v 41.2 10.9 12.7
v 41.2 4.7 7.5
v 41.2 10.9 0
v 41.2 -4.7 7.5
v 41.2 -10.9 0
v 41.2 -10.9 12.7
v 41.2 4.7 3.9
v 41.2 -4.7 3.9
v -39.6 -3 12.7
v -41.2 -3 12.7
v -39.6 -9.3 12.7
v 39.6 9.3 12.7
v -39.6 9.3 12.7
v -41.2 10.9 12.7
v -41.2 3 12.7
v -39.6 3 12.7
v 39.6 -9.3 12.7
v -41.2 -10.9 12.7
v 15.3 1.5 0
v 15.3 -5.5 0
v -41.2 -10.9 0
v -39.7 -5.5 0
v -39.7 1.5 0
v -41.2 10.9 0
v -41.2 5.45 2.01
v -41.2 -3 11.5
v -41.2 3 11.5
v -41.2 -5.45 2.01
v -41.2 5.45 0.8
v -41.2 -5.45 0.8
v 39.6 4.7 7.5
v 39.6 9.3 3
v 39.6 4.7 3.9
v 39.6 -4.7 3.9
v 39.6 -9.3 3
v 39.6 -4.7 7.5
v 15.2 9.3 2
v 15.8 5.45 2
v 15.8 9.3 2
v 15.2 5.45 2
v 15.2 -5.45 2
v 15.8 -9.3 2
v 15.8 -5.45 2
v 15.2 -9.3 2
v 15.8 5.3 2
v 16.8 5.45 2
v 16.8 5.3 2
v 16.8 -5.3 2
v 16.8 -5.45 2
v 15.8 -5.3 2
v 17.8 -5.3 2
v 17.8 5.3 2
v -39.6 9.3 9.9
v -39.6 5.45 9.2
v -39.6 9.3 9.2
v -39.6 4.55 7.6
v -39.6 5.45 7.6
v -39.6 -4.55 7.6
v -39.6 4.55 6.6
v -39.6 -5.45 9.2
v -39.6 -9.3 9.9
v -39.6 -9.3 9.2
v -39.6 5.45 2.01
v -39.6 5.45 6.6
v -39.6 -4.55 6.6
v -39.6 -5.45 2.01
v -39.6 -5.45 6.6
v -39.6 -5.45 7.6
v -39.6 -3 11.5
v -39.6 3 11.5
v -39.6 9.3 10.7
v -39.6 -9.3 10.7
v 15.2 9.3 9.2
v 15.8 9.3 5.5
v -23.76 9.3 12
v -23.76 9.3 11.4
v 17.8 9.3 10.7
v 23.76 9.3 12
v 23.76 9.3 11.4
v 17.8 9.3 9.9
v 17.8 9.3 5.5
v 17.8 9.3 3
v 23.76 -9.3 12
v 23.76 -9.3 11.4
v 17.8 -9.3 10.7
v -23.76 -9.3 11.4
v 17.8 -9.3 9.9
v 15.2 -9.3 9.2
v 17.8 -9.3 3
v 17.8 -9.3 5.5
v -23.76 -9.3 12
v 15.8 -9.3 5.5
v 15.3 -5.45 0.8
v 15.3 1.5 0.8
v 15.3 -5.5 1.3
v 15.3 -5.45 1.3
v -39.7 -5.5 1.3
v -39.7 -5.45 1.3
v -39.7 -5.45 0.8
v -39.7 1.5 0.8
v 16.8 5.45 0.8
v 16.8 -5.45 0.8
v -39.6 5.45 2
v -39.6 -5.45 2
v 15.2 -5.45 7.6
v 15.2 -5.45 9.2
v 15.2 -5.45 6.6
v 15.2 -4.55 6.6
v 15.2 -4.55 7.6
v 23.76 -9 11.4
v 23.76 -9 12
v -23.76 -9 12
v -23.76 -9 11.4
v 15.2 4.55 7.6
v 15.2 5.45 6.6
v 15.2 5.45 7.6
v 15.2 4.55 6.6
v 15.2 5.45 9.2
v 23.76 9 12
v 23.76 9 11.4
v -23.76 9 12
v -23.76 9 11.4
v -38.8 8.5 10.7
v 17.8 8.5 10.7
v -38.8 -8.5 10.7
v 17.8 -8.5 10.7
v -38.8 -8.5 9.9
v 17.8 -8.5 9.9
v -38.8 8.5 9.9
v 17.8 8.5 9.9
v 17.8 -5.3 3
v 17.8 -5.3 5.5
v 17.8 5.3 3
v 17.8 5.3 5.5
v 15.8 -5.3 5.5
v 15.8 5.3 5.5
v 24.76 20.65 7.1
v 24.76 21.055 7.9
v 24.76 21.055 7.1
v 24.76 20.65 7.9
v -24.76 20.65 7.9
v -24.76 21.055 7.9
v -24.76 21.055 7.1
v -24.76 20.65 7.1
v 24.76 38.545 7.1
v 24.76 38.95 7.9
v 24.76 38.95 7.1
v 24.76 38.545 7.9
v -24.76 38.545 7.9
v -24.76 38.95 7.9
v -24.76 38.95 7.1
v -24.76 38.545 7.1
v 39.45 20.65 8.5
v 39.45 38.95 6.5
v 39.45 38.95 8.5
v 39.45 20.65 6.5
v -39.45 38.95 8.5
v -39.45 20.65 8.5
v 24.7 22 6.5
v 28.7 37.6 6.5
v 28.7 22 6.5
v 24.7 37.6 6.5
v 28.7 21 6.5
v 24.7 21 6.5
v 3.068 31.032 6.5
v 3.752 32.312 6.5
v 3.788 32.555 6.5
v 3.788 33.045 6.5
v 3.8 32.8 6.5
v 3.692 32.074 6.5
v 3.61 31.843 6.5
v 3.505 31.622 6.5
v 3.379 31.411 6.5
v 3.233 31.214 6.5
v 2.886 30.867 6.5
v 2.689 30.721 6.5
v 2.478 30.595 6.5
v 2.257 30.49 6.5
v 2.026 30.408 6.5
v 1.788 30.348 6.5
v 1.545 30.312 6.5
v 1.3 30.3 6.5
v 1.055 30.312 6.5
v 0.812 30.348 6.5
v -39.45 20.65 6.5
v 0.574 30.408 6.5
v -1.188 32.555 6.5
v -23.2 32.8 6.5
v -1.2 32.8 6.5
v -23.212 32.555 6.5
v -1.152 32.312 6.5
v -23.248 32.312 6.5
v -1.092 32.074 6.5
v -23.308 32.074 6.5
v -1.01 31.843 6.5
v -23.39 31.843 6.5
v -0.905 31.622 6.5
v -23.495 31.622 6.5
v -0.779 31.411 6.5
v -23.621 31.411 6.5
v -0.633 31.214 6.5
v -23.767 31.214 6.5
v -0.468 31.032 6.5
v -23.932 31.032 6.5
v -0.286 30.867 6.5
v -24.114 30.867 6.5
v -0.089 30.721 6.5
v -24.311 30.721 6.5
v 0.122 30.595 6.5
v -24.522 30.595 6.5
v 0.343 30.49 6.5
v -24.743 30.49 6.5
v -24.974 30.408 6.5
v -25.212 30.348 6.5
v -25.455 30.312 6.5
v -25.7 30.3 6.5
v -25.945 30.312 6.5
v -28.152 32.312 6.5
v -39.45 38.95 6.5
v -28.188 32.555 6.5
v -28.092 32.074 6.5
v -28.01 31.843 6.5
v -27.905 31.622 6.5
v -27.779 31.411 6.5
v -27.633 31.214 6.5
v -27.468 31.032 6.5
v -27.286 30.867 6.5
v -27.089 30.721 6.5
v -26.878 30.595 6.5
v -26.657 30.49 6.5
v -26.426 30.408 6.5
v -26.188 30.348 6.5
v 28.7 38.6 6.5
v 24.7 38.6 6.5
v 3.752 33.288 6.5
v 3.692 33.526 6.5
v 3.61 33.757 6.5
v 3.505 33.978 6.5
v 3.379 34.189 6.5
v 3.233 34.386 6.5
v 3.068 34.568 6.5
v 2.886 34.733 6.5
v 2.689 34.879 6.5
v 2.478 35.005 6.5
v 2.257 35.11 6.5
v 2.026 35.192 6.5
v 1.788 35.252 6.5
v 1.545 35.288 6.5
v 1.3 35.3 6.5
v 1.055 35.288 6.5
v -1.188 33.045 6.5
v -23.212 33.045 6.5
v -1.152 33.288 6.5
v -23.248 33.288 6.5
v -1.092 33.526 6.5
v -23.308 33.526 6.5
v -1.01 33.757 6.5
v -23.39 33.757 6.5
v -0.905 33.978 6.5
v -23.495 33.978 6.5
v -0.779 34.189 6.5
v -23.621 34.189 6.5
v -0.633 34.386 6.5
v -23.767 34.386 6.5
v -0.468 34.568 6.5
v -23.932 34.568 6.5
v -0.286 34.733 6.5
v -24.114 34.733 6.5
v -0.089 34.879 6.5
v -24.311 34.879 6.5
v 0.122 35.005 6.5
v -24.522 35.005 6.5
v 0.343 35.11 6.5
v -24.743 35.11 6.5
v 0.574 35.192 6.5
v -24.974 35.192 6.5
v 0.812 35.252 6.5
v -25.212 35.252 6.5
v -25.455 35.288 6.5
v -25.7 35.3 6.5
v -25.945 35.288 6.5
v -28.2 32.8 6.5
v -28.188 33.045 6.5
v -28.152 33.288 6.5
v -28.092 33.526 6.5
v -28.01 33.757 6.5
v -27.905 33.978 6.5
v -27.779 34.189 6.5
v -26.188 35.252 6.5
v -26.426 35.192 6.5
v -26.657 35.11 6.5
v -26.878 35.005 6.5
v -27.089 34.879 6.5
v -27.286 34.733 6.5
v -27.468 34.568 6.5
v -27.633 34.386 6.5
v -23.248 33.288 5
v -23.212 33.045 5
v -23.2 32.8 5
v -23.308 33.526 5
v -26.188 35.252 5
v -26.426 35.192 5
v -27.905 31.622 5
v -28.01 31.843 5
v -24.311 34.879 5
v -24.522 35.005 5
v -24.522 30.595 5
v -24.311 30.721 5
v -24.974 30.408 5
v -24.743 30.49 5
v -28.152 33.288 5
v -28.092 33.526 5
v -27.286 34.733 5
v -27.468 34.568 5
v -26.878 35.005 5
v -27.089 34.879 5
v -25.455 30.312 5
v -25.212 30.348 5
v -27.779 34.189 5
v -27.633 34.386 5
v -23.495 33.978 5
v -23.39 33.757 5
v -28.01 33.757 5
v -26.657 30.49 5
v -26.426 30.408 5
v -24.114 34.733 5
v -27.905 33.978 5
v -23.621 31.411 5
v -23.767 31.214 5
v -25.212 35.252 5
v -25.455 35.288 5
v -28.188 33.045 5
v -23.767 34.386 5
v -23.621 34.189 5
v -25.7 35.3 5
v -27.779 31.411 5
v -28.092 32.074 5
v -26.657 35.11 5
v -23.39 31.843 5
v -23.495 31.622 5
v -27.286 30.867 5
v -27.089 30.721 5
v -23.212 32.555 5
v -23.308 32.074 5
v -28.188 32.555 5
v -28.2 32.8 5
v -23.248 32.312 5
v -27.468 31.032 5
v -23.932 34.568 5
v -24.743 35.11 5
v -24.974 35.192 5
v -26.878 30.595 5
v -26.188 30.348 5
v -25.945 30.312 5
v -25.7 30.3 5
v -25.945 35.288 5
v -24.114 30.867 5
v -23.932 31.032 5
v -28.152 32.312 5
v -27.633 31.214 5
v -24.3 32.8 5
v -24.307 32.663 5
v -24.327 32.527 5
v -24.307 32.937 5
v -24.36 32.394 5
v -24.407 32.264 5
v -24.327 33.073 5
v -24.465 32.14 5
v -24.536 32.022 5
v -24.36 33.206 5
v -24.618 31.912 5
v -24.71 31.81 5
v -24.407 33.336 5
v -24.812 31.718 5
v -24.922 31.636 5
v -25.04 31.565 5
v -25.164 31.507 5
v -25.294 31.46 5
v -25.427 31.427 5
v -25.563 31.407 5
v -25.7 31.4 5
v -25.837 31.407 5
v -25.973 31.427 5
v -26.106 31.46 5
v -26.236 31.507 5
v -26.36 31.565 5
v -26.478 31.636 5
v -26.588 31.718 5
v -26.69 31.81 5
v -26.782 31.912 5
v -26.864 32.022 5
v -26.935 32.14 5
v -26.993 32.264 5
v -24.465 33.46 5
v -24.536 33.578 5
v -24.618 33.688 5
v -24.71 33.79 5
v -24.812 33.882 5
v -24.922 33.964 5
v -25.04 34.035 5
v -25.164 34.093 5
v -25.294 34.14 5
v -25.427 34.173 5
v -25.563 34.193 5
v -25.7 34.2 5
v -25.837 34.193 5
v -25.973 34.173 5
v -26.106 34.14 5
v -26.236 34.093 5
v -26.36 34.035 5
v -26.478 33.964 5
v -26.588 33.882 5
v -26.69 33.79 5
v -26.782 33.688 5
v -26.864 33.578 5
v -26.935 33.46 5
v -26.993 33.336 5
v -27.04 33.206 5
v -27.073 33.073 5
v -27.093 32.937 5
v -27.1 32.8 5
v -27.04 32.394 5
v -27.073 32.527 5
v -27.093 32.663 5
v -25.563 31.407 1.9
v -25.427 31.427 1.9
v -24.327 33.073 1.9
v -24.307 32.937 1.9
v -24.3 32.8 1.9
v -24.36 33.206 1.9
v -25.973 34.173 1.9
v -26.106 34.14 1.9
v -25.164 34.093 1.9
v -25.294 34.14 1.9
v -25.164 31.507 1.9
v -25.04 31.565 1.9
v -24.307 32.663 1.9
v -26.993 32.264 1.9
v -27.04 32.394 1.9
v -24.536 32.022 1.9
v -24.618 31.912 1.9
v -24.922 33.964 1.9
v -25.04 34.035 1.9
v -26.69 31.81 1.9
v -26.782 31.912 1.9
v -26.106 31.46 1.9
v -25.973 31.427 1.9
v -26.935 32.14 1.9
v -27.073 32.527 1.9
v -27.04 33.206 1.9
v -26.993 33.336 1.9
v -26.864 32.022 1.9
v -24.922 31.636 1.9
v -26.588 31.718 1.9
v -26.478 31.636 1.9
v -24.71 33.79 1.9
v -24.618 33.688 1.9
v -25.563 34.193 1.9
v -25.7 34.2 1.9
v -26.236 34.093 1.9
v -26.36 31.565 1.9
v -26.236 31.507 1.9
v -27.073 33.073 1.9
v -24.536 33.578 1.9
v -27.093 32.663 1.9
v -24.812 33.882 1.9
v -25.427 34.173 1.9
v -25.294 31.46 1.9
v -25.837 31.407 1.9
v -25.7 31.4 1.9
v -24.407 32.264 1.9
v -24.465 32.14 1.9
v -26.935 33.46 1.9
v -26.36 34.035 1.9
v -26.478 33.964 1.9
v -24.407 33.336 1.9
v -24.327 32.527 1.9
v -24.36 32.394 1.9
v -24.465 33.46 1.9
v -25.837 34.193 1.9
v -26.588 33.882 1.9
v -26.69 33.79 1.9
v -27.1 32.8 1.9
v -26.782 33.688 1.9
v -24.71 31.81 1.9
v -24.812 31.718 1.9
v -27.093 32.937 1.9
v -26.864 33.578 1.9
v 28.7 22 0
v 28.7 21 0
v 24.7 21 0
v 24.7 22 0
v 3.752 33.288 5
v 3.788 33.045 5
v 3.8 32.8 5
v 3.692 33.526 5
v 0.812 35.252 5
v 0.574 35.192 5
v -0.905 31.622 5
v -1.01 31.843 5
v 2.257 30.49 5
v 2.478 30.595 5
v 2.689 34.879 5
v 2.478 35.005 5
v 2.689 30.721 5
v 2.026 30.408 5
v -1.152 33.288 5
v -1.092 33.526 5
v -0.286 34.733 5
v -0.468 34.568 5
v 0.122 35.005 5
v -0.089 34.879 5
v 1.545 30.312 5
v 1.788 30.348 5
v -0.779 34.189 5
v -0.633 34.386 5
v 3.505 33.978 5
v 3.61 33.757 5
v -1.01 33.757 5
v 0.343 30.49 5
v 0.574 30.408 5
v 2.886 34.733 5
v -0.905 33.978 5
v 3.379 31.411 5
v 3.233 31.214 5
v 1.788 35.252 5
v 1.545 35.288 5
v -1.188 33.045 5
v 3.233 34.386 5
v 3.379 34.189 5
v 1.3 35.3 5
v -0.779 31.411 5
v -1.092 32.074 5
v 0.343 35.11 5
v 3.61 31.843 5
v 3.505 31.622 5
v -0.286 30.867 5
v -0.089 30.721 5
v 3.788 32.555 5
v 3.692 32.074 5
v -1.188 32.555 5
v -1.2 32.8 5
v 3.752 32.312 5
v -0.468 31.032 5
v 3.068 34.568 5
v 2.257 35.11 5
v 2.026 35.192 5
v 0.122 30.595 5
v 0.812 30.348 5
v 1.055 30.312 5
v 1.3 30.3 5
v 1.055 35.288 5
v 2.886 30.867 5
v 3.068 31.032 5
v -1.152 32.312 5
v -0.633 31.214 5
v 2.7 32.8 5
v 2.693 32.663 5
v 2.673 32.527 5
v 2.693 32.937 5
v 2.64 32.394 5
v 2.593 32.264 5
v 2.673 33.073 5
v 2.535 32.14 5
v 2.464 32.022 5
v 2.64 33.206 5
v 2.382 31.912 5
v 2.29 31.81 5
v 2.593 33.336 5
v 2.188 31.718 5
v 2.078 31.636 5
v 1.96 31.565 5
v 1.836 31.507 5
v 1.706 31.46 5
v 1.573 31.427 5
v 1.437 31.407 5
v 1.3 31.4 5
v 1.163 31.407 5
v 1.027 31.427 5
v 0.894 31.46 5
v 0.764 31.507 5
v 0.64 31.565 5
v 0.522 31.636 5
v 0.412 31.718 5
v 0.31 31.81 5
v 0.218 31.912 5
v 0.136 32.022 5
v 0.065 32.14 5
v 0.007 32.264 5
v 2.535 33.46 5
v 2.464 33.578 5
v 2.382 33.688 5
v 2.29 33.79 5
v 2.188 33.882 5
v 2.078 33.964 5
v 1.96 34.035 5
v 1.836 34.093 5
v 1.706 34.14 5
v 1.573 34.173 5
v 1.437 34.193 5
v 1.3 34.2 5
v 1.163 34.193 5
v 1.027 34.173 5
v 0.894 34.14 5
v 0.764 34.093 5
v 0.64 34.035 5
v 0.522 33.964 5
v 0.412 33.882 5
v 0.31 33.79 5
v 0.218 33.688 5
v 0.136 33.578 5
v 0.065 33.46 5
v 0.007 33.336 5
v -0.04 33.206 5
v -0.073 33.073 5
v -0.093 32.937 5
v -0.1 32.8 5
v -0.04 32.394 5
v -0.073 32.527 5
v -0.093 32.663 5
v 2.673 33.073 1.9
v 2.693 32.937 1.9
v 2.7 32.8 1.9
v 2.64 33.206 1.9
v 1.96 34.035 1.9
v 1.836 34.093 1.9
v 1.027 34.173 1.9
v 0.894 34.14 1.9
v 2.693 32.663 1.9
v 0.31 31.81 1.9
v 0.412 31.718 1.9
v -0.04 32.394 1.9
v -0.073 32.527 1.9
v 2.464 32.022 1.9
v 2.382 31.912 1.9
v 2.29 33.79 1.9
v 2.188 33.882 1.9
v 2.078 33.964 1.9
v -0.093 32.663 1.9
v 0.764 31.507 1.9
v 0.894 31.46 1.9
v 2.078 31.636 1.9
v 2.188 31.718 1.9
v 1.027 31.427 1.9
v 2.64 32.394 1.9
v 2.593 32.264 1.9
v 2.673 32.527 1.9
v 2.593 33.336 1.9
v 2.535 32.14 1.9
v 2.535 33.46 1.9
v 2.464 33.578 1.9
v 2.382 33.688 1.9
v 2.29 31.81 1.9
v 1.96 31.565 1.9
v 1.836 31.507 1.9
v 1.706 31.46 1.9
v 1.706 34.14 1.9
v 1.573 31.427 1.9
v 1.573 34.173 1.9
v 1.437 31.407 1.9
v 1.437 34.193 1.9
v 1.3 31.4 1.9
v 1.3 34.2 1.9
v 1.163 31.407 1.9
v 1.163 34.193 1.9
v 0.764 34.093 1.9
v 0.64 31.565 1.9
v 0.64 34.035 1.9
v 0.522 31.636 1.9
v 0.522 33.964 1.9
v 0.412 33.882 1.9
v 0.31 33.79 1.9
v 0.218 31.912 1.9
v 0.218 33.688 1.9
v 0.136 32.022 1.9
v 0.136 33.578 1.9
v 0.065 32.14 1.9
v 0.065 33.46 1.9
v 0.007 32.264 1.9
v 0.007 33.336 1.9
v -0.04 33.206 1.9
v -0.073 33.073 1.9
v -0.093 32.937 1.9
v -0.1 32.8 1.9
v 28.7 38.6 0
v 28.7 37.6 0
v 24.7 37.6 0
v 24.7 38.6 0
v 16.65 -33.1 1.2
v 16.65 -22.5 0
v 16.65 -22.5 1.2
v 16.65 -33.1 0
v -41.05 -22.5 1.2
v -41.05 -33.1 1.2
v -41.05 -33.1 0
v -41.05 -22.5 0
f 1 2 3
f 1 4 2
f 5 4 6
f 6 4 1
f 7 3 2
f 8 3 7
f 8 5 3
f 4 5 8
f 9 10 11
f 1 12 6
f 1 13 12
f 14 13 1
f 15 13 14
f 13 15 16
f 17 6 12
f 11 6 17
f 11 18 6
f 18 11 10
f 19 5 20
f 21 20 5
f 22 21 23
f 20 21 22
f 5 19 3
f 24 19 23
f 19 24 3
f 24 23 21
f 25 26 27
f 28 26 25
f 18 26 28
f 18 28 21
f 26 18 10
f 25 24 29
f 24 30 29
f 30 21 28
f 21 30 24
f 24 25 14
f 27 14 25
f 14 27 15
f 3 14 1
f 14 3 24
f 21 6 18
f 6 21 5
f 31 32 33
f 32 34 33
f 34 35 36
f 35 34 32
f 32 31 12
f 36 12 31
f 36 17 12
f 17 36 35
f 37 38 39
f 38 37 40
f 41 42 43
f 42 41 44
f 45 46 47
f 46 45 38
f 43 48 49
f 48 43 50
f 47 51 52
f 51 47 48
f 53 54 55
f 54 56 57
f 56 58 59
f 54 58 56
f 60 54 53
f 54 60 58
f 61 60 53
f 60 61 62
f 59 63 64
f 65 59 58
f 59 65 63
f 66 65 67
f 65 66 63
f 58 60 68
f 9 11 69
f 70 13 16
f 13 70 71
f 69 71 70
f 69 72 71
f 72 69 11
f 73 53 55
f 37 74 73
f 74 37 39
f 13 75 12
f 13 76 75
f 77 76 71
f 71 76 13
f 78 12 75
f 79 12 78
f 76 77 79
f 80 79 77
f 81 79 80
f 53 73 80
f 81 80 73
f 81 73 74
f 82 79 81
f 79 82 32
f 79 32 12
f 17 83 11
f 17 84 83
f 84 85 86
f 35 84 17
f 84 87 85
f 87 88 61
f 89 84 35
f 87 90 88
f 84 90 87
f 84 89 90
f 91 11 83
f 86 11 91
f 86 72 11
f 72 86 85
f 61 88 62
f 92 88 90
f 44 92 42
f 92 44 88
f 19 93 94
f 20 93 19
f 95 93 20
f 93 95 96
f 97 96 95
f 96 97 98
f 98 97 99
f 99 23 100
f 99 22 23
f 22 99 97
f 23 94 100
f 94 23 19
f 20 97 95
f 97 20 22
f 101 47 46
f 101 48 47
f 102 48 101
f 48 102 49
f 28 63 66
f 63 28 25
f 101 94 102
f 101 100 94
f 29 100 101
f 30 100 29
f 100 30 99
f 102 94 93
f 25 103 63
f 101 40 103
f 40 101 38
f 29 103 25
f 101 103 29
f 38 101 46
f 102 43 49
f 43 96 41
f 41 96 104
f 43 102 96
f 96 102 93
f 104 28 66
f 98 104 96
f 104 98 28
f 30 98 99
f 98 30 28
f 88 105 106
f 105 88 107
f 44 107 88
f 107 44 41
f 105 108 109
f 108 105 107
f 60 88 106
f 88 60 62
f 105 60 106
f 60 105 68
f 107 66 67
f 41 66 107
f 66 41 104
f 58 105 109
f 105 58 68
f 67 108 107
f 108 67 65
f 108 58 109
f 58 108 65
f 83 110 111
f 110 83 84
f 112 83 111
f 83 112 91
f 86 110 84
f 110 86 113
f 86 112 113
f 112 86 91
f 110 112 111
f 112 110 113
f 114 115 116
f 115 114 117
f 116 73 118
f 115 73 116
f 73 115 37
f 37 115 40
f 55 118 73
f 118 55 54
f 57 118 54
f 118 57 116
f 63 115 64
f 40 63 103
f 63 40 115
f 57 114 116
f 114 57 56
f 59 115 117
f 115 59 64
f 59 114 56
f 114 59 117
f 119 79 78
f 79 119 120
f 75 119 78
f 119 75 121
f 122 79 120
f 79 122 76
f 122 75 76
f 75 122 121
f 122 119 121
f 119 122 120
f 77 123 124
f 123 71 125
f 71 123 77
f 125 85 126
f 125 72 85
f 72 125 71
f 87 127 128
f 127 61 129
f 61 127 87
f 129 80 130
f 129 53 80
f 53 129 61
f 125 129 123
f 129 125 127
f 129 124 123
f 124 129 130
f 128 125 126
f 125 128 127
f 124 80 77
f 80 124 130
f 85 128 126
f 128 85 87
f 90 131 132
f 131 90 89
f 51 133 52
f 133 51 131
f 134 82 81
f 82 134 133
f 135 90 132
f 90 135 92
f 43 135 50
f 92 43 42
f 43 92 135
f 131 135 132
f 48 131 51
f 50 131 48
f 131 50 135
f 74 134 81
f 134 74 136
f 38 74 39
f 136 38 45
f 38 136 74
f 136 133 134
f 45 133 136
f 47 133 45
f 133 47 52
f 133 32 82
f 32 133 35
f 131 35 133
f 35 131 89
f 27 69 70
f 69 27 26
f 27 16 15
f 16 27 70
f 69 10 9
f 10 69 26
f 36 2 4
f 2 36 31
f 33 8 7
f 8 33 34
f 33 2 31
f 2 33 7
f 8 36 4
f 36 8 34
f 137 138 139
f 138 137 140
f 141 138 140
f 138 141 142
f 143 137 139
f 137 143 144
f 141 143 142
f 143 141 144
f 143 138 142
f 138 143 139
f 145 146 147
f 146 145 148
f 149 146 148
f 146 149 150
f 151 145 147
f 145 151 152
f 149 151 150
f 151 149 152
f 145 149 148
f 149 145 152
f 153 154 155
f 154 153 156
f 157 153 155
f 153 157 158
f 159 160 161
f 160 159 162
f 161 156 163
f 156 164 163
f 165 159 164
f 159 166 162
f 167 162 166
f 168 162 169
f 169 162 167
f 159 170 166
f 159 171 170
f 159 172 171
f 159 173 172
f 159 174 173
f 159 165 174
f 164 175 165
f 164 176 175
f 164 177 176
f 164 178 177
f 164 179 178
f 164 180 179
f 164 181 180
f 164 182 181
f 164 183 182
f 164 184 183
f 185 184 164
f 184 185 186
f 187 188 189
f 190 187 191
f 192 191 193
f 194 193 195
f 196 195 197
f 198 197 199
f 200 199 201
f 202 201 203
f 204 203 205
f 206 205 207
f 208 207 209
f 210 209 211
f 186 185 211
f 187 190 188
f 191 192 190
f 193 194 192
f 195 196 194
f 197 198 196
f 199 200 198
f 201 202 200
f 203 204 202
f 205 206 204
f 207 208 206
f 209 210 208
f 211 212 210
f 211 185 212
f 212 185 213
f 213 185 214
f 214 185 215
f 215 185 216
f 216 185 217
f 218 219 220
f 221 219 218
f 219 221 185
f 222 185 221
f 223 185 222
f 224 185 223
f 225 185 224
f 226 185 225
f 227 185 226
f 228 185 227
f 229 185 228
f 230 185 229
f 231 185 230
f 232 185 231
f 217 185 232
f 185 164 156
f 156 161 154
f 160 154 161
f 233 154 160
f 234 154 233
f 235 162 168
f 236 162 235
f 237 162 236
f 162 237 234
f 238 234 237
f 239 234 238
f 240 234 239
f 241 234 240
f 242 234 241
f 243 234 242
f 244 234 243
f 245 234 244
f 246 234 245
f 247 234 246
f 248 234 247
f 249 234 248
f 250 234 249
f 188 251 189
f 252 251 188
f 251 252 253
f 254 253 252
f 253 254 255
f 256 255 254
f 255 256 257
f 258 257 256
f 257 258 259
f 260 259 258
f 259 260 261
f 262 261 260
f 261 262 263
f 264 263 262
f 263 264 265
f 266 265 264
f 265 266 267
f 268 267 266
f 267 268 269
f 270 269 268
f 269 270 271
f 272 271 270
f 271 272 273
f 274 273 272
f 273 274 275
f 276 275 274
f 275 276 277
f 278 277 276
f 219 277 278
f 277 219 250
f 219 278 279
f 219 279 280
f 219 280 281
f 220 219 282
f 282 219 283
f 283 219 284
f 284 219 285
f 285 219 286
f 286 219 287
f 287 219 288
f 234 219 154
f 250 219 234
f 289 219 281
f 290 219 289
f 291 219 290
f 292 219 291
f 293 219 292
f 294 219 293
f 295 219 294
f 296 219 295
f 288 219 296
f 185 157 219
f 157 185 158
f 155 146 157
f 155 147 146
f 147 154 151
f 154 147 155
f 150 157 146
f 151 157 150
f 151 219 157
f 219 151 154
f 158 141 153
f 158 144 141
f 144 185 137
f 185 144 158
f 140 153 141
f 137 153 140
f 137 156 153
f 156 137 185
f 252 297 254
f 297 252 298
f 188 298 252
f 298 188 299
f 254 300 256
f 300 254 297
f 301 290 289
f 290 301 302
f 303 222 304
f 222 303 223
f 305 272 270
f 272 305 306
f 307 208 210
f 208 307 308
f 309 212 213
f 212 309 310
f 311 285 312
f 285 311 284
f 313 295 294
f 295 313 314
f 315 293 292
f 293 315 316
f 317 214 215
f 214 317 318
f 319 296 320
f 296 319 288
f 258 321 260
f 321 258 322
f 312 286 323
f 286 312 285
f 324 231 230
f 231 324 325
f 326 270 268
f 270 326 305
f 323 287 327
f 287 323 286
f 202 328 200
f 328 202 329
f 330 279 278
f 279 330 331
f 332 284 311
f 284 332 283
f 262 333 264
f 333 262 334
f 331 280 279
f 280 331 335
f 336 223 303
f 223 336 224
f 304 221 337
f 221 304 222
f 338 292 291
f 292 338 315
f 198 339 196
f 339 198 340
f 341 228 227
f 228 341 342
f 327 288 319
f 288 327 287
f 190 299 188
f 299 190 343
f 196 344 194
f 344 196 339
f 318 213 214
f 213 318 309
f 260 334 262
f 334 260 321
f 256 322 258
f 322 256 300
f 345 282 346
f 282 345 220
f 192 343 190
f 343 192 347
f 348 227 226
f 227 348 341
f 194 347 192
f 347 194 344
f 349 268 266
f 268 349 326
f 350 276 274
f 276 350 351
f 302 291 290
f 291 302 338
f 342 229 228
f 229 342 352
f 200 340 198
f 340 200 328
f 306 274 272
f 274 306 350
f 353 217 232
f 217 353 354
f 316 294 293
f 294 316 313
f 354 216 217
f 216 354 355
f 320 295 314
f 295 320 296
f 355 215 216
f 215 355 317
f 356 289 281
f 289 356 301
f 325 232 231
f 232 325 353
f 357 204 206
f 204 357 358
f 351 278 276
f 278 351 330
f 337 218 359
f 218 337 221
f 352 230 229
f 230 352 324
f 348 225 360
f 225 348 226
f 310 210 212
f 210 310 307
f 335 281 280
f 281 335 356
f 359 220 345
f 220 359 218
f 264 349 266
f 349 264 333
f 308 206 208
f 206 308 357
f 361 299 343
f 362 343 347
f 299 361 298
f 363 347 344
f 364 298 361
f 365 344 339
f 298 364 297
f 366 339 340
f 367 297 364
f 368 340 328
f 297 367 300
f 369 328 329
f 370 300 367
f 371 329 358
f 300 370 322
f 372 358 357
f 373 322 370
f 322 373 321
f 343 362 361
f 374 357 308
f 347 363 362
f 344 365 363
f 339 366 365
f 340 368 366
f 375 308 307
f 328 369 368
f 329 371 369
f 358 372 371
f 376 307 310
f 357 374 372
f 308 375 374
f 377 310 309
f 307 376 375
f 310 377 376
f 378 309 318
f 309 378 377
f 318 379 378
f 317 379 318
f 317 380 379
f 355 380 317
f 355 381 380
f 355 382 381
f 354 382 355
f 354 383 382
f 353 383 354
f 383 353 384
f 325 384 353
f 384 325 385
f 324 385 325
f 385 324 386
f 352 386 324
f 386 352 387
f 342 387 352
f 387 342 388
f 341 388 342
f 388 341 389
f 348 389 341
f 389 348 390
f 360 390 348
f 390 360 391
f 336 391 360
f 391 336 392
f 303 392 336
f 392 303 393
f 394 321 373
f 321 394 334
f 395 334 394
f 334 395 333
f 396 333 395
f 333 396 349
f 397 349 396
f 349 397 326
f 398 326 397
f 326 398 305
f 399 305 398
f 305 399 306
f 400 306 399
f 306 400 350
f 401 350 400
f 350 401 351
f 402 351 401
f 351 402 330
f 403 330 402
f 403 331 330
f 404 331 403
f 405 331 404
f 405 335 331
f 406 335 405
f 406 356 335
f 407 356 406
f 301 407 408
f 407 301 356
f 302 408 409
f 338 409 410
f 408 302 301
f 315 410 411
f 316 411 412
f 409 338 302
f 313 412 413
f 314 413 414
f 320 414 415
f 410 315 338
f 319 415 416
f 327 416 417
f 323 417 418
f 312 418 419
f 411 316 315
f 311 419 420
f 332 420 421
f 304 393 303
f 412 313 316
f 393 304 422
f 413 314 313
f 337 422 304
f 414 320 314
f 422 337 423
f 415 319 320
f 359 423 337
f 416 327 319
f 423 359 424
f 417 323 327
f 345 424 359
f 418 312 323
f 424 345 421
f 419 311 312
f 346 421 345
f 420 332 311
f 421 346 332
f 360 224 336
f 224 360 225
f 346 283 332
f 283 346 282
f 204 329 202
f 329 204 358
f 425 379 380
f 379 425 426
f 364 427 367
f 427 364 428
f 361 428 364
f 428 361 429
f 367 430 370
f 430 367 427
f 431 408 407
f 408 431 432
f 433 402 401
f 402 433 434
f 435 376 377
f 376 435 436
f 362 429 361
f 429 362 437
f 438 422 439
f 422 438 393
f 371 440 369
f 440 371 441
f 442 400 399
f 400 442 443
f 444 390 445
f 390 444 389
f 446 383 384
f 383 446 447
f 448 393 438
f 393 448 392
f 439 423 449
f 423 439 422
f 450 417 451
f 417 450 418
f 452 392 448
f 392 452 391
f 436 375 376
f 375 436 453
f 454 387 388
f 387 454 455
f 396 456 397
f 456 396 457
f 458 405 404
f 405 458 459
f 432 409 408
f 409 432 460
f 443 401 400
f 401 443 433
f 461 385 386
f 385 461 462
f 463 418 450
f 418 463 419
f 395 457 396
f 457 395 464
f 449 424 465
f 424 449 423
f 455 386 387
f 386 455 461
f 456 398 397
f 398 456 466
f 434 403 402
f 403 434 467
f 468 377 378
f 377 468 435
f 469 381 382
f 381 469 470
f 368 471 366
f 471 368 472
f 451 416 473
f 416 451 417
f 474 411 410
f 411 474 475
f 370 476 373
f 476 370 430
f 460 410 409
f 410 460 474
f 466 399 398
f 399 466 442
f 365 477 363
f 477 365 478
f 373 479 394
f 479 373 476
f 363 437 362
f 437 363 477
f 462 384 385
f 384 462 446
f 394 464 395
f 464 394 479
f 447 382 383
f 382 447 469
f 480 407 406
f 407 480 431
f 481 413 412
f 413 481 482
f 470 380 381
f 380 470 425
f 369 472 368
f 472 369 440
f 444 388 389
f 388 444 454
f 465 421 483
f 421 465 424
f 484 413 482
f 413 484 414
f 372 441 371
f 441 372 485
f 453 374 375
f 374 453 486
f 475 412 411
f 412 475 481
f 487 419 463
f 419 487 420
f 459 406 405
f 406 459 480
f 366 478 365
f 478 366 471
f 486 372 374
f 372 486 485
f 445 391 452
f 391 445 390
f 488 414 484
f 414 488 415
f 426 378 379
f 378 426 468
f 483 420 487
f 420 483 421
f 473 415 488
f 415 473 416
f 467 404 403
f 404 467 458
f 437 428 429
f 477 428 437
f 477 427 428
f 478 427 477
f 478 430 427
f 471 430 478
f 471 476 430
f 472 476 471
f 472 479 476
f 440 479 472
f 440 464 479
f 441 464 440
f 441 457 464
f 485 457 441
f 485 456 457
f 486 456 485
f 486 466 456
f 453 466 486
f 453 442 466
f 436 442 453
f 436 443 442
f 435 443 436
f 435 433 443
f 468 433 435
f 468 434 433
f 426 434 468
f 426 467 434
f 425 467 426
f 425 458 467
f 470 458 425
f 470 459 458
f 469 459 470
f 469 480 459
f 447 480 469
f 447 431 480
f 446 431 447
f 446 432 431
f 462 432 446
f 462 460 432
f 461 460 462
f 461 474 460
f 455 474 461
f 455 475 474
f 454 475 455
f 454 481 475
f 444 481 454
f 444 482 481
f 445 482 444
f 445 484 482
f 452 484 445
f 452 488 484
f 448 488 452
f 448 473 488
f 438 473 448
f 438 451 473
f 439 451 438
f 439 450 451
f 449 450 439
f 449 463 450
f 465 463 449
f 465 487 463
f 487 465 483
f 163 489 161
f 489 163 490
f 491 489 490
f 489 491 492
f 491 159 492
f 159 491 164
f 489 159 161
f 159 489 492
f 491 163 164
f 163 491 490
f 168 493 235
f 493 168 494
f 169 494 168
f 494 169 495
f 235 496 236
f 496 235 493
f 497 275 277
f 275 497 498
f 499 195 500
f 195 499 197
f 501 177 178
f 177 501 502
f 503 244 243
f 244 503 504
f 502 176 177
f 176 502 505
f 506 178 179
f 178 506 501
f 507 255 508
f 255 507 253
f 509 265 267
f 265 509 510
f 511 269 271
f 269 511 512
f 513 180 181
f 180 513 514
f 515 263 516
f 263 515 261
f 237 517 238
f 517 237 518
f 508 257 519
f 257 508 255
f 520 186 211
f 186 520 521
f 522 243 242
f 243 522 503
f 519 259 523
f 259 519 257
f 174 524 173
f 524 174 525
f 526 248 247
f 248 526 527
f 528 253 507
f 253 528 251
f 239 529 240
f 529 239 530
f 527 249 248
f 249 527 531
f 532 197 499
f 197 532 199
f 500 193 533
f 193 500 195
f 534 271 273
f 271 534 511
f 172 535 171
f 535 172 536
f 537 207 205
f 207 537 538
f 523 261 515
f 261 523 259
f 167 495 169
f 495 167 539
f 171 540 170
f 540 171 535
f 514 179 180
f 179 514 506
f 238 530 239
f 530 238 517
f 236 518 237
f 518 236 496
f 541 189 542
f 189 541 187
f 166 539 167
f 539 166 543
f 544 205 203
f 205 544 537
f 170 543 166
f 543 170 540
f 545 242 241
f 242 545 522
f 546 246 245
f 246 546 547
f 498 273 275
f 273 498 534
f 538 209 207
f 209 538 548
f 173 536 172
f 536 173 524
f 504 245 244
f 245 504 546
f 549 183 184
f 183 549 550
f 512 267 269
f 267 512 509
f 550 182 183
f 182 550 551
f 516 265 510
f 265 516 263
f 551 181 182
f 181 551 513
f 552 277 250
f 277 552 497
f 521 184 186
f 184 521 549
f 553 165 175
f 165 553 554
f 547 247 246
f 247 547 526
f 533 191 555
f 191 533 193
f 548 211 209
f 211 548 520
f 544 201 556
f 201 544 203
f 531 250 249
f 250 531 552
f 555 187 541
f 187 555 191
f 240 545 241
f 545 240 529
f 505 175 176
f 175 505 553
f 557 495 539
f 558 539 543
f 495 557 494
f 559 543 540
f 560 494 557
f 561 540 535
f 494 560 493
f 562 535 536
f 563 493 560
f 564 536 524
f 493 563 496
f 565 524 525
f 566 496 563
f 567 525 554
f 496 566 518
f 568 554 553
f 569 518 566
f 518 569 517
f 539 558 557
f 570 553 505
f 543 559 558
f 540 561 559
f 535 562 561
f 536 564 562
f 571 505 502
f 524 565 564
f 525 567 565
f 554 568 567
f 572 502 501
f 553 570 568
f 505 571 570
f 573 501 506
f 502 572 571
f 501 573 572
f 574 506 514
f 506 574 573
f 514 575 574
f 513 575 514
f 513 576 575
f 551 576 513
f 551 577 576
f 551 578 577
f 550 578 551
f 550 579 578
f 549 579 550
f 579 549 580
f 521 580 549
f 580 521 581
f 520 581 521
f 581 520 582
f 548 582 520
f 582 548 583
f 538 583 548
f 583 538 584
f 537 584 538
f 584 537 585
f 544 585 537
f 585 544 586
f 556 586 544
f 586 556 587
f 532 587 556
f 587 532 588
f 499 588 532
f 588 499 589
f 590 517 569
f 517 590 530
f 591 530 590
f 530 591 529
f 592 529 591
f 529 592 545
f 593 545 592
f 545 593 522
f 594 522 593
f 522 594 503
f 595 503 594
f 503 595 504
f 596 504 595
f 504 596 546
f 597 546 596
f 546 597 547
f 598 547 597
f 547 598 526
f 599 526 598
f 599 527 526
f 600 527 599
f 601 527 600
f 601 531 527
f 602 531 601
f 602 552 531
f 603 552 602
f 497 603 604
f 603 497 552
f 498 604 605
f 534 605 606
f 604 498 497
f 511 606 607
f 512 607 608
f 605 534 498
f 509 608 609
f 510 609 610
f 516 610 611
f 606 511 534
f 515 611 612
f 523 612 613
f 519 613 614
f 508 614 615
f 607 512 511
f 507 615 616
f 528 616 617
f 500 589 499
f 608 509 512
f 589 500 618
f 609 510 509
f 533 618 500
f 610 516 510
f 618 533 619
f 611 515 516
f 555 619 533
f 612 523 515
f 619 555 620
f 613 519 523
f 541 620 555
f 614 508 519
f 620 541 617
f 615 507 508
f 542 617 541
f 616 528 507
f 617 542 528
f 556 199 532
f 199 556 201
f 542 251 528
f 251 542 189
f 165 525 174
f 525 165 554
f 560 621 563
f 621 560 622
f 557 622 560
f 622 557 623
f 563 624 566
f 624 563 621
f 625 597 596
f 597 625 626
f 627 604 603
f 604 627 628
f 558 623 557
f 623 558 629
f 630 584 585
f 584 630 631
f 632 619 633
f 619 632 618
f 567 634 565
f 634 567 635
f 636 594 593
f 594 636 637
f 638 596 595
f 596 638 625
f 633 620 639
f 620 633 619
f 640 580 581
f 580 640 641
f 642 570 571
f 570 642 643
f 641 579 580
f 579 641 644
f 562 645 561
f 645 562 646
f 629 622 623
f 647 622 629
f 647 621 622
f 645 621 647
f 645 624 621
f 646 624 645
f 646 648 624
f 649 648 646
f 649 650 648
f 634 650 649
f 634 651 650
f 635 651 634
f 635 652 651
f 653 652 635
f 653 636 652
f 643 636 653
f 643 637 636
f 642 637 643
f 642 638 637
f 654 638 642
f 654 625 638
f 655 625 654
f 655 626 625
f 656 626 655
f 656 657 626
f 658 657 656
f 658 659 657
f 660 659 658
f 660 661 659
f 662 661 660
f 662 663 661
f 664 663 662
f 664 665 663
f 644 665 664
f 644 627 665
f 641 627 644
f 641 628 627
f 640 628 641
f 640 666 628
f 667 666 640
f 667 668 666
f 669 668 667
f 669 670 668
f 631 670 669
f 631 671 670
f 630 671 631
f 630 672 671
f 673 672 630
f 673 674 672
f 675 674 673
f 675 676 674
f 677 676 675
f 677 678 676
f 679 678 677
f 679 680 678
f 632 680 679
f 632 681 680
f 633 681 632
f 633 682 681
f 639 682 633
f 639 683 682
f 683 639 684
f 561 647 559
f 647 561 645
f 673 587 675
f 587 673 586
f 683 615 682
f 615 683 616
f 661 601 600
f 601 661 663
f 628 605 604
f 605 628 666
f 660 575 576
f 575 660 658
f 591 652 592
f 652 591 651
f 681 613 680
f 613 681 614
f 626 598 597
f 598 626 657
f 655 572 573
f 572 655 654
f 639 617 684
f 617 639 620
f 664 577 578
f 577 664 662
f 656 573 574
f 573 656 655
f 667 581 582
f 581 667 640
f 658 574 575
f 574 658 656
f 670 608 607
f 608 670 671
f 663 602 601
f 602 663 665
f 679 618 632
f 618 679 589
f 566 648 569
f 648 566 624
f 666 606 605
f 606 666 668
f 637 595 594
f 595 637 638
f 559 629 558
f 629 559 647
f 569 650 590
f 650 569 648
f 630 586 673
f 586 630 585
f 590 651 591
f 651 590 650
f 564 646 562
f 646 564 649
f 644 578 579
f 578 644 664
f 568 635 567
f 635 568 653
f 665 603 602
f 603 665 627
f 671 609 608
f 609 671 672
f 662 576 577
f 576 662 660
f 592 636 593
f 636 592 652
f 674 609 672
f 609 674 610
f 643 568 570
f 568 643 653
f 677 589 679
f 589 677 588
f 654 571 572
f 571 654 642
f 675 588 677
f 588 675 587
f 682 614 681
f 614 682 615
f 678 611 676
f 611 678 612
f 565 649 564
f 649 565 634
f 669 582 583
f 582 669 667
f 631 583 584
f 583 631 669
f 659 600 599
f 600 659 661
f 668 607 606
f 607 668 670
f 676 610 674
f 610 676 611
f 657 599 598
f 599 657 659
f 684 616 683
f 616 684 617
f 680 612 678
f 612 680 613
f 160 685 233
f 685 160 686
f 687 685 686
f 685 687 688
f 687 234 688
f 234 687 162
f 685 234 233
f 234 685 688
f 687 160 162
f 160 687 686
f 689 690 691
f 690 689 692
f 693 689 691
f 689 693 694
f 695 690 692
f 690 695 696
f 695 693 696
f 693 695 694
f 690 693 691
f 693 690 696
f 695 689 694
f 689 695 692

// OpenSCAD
// Desk Accent (#221) enclosure: OpenSCAD port of desk_accent_case.py (build123d).
// Both files describe the same geometry. If you change a dimension, change it in both, or
// regenerate the STLs from one and treat the other as stale.
//
// A slim inline bar stuck under the G9's bottom edge, in front of the stand neck, window DOWN.
//   body   : opaque PLA (black). Prints floor-down as modelled.
//   lid    : opaque PLA. A plate that SNAPS flush into the top of the body (a bead on the body's
//            long walls clicks into a groove round the lid edge). Exported flat face down. The
//            flat face takes the adhesive against the monitor. Pry notch in the LED-end wall.
//   window : CLEAR PLA, printed on the TEXTURED PEI plate. The frosted face goes DOWN.
//
// Export one part:  openscad -D 'PART="body"' -o desk_accent_body.stl desk_accent_case.scad
// PART: "all" (assembly preview), "body", "lid", "window".
PART = "all";

$fn = 64;

// ---- parts ----
STICK_L = 54.0; STICK_W = 10.1; STICK_H = 3.2;   // 8x WS2812B stick (measured 54 x 10.1)
STICK_PCB = 1.6;
// Stick mounting holes: dia ~3.1, 27 mm apart. HOLE_Y and LED_Y are offsets from the bar's
// centreline, ESTIMATED from a photo. Re-measure if the pins miss the holes.
HOLE_PITCH = 27.0; HOLE_Y = 3.0; LED_Y = -2.0;
PIN_D = 2.8; SHOULDER_D = 5.0;
XIAO_L = 21.0; XIAO_W = 17.8; XIAO_PCB = 1.2;    // Seeed XIAO ESP32S3
USB_W = 9.4; USB_H = 3.6;

// ---- case ----
CLR = 0.4; WALL = 1.6;
LIP_T = 0.8; WIN_T = 1.2; FLOOR = LIP_T + WIN_T;
APER_L = STICK_L + 1.0; APER_W = 7.0;            // light aperture over the LED row
WIN_L = APER_L + 3.0; WIN_W = STICK_W + 2 * CLR; // window pocket spans the stick channel
FIT = 0.15;
LED_GAP = 4.0;        // LED face to window top
LEDGE = 0.9;
WIRE_GAP = 3.0;
LID_T = 2.0; SEAT = 0.8;
BEAD = 0.3; BEAD_H = 0.6; GROOVE = 0.4;          // snap: bead on the walls, groove on the lid
XIAO_PAD = 1.0; STOP_H = 2.5;

IN_W = XIAO_W + 2 * CLR;
IN_L = STICK_L + WIRE_GAP + XIAO_L + 3 * CLR;
IN_H = LED_GAP + STICK_H + 1.5;
OUT_L = IN_L + 2 * WALL; OUT_W = IN_W + 2 * WALL;
LID_Z = FLOOR + IN_H;            // lid underside (body frame)
OUT_H = LID_Z + LID_T;           // body top = lid top (flush)
x0 = -IN_L / 2;
stick_cx = x0 + CLR + STICK_L / 2;
xiao_cx = x0 + CLR + STICK_L + WIRE_GAP + CLR + XIAO_L / 2;
xiao_far = xiao_cx - XIAO_L / 2;
side_w = IN_W / 2 - STICK_W / 2 - CLR;
ledge_top = FLOOR + LED_GAP + (STICK_H - STICK_PCB);
usb_z = FLOOR + XIAO_PAD + XIAO_PCB + USB_H / 2 - 0.3;
shoulder_len = LID_Z - (FLOOR + LED_GAP + STICK_H);
pin_len = shoulder_len + STICK_PCB + 1.5;
hold_len = LID_Z - (FLOOR + XIAO_PAD + XIAO_PCB);

// box centred in x/y at (cx, cy), bottom at z (= build123d Align CENTER, CENTER, MIN)
module bx(cx, cy, z, l, w, h) { translate([cx - l / 2, cy - w / 2, z]) cube([l, w, h]); }

module body() {
    difference() {
        union() {
            difference() {
                bx(0, 0, 0, OUT_L, OUT_W, OUT_H);
                bx(0, 0, FLOOR, IN_L, IN_W, OUT_H);                          // cavity
                bx(stick_cx, LED_Y, -0.5, APER_L, APER_W, LIP_T + 1);        // light aperture
                bx(stick_cx, 0, LIP_T, WIN_L, WIN_W, WIN_T + 0.01);          // window pocket
            }
            for (s = [-1, 1]) {
                // side guides, wall to stick edge
                bx(stick_cx, s * (IN_W / 2 - side_w / 2), FLOOR, STICK_L + 2 * CLR, side_w, LED_GAP + STICK_H);
                // ledges under the stick's long edges (LEDs hang below the PCB)
                bx(stick_cx, s * (STICK_W / 2 + CLR - LEDGE / 2), ledge_top - 1.0, STICK_L + 2 * CLR, LEDGE, 1.0);
                // snap beads on the long walls, middle 60 % of the length
                bx(0, s * (IN_W / 2 - BEAD / 2), LID_Z + LID_T / 2 - BEAD_H / 2, IN_L * 0.6, BEAD, BEAD_H);
            }
            // lid seat ring, open along the long walls over the XIAO bay (hold-down posts pass there)
            difference() {
                bx(0, 0, LID_Z - SEAT, IN_L, IN_W, SEAT);
                bx(0, 0, LID_Z - SEAT - 0.01, IN_L - 2 * SEAT, IN_W - 2 * SEAT, SEAT + 0.02);
                bx(xiao_cx, 0, LID_Z - SEAT - 0.01, XIAO_L + 2 * CLR, IN_W, SEAT + 0.02);
            }
            // XIAO cradle: pad + two corner stops at the far edge (centre open for the wires)
            bx(xiao_cx, 0, FLOOR, XIAO_L + 2 * CLR, IN_W, XIAO_PAD);
            for (s = [-1, 1])
                bx(xiao_far - CLR - 1.0, s * (IN_W / 2 - 2.0), FLOOR, 2.0, 4.0, XIAO_PAD + STOP_H);
        }
        bx(-OUT_L / 2 + WALL / 2, 0, OUT_H - 1.2, WALL + 1, 6.0, 2.0);           // pry notch
        translate([OUT_L / 2 - WALL / 2, 0, usb_z]) cube([WALL + 2, USB_W, USB_H], center = true); // USB-C
    }
}

module window() { bx(0, 0, 0, WIN_L - 2 * FIT, WIN_W - 2 * FIT, WIN_T); }

// lid frame: z = 0 is the lid's underside (= body LID_Z); posts and pins hang below it
module lid() {
    union() {
        difference() {
            bx(0, 0, 0, IN_L - 2 * FIT, IN_W - 2 * FIT, LID_T);
            for (s = [-1, 1])   // groove the beads click into
                bx(0, s * (IN_W / 2 - FIT - GROOVE / 2), LID_T / 2 - (BEAD_H + 0.2) / 2,
                   IN_L * 0.6 + 2.0, GROOVE + 0.01, BEAD_H + 0.2);
        }
        for (s = [-1, 1]) {
            px = stick_cx + s * HOLE_PITCH / 2;
            // shoulder clamps the stick onto its ledges; the pin goes through its mounting hole
            translate([px, HOLE_Y, -shoulder_len]) cylinder(d = SHOULDER_D, h = shoulder_len + 0.01);
            translate([px, HOLE_Y, -pin_len]) cylinder(d = PIN_D, h = pin_len - shoulder_len + 0.01);
            // XIAO hold-downs on the board's long-edge pad strips
            bx(xiao_cx - 2.0, s * (XIAO_W / 2 - 0.6), -hold_len, 4.0, 1.0, hold_len + 0.01);
        }
    }
}

if (PART == "body") body();
else if (PART == "lid") translate([0, 0, LID_T]) rotate([180, 0, 0]) lid();   // flat face on the bed
else if (PART == "window") window();
else if (PART == "none") {}   // render_sidebyside.scad draws its own dressed view
else {
    body();
    translate([0, OUT_W + 8, hold_len]) lid();
    translate([stick_cx, -(OUT_W + 6), 0]) window();
}
